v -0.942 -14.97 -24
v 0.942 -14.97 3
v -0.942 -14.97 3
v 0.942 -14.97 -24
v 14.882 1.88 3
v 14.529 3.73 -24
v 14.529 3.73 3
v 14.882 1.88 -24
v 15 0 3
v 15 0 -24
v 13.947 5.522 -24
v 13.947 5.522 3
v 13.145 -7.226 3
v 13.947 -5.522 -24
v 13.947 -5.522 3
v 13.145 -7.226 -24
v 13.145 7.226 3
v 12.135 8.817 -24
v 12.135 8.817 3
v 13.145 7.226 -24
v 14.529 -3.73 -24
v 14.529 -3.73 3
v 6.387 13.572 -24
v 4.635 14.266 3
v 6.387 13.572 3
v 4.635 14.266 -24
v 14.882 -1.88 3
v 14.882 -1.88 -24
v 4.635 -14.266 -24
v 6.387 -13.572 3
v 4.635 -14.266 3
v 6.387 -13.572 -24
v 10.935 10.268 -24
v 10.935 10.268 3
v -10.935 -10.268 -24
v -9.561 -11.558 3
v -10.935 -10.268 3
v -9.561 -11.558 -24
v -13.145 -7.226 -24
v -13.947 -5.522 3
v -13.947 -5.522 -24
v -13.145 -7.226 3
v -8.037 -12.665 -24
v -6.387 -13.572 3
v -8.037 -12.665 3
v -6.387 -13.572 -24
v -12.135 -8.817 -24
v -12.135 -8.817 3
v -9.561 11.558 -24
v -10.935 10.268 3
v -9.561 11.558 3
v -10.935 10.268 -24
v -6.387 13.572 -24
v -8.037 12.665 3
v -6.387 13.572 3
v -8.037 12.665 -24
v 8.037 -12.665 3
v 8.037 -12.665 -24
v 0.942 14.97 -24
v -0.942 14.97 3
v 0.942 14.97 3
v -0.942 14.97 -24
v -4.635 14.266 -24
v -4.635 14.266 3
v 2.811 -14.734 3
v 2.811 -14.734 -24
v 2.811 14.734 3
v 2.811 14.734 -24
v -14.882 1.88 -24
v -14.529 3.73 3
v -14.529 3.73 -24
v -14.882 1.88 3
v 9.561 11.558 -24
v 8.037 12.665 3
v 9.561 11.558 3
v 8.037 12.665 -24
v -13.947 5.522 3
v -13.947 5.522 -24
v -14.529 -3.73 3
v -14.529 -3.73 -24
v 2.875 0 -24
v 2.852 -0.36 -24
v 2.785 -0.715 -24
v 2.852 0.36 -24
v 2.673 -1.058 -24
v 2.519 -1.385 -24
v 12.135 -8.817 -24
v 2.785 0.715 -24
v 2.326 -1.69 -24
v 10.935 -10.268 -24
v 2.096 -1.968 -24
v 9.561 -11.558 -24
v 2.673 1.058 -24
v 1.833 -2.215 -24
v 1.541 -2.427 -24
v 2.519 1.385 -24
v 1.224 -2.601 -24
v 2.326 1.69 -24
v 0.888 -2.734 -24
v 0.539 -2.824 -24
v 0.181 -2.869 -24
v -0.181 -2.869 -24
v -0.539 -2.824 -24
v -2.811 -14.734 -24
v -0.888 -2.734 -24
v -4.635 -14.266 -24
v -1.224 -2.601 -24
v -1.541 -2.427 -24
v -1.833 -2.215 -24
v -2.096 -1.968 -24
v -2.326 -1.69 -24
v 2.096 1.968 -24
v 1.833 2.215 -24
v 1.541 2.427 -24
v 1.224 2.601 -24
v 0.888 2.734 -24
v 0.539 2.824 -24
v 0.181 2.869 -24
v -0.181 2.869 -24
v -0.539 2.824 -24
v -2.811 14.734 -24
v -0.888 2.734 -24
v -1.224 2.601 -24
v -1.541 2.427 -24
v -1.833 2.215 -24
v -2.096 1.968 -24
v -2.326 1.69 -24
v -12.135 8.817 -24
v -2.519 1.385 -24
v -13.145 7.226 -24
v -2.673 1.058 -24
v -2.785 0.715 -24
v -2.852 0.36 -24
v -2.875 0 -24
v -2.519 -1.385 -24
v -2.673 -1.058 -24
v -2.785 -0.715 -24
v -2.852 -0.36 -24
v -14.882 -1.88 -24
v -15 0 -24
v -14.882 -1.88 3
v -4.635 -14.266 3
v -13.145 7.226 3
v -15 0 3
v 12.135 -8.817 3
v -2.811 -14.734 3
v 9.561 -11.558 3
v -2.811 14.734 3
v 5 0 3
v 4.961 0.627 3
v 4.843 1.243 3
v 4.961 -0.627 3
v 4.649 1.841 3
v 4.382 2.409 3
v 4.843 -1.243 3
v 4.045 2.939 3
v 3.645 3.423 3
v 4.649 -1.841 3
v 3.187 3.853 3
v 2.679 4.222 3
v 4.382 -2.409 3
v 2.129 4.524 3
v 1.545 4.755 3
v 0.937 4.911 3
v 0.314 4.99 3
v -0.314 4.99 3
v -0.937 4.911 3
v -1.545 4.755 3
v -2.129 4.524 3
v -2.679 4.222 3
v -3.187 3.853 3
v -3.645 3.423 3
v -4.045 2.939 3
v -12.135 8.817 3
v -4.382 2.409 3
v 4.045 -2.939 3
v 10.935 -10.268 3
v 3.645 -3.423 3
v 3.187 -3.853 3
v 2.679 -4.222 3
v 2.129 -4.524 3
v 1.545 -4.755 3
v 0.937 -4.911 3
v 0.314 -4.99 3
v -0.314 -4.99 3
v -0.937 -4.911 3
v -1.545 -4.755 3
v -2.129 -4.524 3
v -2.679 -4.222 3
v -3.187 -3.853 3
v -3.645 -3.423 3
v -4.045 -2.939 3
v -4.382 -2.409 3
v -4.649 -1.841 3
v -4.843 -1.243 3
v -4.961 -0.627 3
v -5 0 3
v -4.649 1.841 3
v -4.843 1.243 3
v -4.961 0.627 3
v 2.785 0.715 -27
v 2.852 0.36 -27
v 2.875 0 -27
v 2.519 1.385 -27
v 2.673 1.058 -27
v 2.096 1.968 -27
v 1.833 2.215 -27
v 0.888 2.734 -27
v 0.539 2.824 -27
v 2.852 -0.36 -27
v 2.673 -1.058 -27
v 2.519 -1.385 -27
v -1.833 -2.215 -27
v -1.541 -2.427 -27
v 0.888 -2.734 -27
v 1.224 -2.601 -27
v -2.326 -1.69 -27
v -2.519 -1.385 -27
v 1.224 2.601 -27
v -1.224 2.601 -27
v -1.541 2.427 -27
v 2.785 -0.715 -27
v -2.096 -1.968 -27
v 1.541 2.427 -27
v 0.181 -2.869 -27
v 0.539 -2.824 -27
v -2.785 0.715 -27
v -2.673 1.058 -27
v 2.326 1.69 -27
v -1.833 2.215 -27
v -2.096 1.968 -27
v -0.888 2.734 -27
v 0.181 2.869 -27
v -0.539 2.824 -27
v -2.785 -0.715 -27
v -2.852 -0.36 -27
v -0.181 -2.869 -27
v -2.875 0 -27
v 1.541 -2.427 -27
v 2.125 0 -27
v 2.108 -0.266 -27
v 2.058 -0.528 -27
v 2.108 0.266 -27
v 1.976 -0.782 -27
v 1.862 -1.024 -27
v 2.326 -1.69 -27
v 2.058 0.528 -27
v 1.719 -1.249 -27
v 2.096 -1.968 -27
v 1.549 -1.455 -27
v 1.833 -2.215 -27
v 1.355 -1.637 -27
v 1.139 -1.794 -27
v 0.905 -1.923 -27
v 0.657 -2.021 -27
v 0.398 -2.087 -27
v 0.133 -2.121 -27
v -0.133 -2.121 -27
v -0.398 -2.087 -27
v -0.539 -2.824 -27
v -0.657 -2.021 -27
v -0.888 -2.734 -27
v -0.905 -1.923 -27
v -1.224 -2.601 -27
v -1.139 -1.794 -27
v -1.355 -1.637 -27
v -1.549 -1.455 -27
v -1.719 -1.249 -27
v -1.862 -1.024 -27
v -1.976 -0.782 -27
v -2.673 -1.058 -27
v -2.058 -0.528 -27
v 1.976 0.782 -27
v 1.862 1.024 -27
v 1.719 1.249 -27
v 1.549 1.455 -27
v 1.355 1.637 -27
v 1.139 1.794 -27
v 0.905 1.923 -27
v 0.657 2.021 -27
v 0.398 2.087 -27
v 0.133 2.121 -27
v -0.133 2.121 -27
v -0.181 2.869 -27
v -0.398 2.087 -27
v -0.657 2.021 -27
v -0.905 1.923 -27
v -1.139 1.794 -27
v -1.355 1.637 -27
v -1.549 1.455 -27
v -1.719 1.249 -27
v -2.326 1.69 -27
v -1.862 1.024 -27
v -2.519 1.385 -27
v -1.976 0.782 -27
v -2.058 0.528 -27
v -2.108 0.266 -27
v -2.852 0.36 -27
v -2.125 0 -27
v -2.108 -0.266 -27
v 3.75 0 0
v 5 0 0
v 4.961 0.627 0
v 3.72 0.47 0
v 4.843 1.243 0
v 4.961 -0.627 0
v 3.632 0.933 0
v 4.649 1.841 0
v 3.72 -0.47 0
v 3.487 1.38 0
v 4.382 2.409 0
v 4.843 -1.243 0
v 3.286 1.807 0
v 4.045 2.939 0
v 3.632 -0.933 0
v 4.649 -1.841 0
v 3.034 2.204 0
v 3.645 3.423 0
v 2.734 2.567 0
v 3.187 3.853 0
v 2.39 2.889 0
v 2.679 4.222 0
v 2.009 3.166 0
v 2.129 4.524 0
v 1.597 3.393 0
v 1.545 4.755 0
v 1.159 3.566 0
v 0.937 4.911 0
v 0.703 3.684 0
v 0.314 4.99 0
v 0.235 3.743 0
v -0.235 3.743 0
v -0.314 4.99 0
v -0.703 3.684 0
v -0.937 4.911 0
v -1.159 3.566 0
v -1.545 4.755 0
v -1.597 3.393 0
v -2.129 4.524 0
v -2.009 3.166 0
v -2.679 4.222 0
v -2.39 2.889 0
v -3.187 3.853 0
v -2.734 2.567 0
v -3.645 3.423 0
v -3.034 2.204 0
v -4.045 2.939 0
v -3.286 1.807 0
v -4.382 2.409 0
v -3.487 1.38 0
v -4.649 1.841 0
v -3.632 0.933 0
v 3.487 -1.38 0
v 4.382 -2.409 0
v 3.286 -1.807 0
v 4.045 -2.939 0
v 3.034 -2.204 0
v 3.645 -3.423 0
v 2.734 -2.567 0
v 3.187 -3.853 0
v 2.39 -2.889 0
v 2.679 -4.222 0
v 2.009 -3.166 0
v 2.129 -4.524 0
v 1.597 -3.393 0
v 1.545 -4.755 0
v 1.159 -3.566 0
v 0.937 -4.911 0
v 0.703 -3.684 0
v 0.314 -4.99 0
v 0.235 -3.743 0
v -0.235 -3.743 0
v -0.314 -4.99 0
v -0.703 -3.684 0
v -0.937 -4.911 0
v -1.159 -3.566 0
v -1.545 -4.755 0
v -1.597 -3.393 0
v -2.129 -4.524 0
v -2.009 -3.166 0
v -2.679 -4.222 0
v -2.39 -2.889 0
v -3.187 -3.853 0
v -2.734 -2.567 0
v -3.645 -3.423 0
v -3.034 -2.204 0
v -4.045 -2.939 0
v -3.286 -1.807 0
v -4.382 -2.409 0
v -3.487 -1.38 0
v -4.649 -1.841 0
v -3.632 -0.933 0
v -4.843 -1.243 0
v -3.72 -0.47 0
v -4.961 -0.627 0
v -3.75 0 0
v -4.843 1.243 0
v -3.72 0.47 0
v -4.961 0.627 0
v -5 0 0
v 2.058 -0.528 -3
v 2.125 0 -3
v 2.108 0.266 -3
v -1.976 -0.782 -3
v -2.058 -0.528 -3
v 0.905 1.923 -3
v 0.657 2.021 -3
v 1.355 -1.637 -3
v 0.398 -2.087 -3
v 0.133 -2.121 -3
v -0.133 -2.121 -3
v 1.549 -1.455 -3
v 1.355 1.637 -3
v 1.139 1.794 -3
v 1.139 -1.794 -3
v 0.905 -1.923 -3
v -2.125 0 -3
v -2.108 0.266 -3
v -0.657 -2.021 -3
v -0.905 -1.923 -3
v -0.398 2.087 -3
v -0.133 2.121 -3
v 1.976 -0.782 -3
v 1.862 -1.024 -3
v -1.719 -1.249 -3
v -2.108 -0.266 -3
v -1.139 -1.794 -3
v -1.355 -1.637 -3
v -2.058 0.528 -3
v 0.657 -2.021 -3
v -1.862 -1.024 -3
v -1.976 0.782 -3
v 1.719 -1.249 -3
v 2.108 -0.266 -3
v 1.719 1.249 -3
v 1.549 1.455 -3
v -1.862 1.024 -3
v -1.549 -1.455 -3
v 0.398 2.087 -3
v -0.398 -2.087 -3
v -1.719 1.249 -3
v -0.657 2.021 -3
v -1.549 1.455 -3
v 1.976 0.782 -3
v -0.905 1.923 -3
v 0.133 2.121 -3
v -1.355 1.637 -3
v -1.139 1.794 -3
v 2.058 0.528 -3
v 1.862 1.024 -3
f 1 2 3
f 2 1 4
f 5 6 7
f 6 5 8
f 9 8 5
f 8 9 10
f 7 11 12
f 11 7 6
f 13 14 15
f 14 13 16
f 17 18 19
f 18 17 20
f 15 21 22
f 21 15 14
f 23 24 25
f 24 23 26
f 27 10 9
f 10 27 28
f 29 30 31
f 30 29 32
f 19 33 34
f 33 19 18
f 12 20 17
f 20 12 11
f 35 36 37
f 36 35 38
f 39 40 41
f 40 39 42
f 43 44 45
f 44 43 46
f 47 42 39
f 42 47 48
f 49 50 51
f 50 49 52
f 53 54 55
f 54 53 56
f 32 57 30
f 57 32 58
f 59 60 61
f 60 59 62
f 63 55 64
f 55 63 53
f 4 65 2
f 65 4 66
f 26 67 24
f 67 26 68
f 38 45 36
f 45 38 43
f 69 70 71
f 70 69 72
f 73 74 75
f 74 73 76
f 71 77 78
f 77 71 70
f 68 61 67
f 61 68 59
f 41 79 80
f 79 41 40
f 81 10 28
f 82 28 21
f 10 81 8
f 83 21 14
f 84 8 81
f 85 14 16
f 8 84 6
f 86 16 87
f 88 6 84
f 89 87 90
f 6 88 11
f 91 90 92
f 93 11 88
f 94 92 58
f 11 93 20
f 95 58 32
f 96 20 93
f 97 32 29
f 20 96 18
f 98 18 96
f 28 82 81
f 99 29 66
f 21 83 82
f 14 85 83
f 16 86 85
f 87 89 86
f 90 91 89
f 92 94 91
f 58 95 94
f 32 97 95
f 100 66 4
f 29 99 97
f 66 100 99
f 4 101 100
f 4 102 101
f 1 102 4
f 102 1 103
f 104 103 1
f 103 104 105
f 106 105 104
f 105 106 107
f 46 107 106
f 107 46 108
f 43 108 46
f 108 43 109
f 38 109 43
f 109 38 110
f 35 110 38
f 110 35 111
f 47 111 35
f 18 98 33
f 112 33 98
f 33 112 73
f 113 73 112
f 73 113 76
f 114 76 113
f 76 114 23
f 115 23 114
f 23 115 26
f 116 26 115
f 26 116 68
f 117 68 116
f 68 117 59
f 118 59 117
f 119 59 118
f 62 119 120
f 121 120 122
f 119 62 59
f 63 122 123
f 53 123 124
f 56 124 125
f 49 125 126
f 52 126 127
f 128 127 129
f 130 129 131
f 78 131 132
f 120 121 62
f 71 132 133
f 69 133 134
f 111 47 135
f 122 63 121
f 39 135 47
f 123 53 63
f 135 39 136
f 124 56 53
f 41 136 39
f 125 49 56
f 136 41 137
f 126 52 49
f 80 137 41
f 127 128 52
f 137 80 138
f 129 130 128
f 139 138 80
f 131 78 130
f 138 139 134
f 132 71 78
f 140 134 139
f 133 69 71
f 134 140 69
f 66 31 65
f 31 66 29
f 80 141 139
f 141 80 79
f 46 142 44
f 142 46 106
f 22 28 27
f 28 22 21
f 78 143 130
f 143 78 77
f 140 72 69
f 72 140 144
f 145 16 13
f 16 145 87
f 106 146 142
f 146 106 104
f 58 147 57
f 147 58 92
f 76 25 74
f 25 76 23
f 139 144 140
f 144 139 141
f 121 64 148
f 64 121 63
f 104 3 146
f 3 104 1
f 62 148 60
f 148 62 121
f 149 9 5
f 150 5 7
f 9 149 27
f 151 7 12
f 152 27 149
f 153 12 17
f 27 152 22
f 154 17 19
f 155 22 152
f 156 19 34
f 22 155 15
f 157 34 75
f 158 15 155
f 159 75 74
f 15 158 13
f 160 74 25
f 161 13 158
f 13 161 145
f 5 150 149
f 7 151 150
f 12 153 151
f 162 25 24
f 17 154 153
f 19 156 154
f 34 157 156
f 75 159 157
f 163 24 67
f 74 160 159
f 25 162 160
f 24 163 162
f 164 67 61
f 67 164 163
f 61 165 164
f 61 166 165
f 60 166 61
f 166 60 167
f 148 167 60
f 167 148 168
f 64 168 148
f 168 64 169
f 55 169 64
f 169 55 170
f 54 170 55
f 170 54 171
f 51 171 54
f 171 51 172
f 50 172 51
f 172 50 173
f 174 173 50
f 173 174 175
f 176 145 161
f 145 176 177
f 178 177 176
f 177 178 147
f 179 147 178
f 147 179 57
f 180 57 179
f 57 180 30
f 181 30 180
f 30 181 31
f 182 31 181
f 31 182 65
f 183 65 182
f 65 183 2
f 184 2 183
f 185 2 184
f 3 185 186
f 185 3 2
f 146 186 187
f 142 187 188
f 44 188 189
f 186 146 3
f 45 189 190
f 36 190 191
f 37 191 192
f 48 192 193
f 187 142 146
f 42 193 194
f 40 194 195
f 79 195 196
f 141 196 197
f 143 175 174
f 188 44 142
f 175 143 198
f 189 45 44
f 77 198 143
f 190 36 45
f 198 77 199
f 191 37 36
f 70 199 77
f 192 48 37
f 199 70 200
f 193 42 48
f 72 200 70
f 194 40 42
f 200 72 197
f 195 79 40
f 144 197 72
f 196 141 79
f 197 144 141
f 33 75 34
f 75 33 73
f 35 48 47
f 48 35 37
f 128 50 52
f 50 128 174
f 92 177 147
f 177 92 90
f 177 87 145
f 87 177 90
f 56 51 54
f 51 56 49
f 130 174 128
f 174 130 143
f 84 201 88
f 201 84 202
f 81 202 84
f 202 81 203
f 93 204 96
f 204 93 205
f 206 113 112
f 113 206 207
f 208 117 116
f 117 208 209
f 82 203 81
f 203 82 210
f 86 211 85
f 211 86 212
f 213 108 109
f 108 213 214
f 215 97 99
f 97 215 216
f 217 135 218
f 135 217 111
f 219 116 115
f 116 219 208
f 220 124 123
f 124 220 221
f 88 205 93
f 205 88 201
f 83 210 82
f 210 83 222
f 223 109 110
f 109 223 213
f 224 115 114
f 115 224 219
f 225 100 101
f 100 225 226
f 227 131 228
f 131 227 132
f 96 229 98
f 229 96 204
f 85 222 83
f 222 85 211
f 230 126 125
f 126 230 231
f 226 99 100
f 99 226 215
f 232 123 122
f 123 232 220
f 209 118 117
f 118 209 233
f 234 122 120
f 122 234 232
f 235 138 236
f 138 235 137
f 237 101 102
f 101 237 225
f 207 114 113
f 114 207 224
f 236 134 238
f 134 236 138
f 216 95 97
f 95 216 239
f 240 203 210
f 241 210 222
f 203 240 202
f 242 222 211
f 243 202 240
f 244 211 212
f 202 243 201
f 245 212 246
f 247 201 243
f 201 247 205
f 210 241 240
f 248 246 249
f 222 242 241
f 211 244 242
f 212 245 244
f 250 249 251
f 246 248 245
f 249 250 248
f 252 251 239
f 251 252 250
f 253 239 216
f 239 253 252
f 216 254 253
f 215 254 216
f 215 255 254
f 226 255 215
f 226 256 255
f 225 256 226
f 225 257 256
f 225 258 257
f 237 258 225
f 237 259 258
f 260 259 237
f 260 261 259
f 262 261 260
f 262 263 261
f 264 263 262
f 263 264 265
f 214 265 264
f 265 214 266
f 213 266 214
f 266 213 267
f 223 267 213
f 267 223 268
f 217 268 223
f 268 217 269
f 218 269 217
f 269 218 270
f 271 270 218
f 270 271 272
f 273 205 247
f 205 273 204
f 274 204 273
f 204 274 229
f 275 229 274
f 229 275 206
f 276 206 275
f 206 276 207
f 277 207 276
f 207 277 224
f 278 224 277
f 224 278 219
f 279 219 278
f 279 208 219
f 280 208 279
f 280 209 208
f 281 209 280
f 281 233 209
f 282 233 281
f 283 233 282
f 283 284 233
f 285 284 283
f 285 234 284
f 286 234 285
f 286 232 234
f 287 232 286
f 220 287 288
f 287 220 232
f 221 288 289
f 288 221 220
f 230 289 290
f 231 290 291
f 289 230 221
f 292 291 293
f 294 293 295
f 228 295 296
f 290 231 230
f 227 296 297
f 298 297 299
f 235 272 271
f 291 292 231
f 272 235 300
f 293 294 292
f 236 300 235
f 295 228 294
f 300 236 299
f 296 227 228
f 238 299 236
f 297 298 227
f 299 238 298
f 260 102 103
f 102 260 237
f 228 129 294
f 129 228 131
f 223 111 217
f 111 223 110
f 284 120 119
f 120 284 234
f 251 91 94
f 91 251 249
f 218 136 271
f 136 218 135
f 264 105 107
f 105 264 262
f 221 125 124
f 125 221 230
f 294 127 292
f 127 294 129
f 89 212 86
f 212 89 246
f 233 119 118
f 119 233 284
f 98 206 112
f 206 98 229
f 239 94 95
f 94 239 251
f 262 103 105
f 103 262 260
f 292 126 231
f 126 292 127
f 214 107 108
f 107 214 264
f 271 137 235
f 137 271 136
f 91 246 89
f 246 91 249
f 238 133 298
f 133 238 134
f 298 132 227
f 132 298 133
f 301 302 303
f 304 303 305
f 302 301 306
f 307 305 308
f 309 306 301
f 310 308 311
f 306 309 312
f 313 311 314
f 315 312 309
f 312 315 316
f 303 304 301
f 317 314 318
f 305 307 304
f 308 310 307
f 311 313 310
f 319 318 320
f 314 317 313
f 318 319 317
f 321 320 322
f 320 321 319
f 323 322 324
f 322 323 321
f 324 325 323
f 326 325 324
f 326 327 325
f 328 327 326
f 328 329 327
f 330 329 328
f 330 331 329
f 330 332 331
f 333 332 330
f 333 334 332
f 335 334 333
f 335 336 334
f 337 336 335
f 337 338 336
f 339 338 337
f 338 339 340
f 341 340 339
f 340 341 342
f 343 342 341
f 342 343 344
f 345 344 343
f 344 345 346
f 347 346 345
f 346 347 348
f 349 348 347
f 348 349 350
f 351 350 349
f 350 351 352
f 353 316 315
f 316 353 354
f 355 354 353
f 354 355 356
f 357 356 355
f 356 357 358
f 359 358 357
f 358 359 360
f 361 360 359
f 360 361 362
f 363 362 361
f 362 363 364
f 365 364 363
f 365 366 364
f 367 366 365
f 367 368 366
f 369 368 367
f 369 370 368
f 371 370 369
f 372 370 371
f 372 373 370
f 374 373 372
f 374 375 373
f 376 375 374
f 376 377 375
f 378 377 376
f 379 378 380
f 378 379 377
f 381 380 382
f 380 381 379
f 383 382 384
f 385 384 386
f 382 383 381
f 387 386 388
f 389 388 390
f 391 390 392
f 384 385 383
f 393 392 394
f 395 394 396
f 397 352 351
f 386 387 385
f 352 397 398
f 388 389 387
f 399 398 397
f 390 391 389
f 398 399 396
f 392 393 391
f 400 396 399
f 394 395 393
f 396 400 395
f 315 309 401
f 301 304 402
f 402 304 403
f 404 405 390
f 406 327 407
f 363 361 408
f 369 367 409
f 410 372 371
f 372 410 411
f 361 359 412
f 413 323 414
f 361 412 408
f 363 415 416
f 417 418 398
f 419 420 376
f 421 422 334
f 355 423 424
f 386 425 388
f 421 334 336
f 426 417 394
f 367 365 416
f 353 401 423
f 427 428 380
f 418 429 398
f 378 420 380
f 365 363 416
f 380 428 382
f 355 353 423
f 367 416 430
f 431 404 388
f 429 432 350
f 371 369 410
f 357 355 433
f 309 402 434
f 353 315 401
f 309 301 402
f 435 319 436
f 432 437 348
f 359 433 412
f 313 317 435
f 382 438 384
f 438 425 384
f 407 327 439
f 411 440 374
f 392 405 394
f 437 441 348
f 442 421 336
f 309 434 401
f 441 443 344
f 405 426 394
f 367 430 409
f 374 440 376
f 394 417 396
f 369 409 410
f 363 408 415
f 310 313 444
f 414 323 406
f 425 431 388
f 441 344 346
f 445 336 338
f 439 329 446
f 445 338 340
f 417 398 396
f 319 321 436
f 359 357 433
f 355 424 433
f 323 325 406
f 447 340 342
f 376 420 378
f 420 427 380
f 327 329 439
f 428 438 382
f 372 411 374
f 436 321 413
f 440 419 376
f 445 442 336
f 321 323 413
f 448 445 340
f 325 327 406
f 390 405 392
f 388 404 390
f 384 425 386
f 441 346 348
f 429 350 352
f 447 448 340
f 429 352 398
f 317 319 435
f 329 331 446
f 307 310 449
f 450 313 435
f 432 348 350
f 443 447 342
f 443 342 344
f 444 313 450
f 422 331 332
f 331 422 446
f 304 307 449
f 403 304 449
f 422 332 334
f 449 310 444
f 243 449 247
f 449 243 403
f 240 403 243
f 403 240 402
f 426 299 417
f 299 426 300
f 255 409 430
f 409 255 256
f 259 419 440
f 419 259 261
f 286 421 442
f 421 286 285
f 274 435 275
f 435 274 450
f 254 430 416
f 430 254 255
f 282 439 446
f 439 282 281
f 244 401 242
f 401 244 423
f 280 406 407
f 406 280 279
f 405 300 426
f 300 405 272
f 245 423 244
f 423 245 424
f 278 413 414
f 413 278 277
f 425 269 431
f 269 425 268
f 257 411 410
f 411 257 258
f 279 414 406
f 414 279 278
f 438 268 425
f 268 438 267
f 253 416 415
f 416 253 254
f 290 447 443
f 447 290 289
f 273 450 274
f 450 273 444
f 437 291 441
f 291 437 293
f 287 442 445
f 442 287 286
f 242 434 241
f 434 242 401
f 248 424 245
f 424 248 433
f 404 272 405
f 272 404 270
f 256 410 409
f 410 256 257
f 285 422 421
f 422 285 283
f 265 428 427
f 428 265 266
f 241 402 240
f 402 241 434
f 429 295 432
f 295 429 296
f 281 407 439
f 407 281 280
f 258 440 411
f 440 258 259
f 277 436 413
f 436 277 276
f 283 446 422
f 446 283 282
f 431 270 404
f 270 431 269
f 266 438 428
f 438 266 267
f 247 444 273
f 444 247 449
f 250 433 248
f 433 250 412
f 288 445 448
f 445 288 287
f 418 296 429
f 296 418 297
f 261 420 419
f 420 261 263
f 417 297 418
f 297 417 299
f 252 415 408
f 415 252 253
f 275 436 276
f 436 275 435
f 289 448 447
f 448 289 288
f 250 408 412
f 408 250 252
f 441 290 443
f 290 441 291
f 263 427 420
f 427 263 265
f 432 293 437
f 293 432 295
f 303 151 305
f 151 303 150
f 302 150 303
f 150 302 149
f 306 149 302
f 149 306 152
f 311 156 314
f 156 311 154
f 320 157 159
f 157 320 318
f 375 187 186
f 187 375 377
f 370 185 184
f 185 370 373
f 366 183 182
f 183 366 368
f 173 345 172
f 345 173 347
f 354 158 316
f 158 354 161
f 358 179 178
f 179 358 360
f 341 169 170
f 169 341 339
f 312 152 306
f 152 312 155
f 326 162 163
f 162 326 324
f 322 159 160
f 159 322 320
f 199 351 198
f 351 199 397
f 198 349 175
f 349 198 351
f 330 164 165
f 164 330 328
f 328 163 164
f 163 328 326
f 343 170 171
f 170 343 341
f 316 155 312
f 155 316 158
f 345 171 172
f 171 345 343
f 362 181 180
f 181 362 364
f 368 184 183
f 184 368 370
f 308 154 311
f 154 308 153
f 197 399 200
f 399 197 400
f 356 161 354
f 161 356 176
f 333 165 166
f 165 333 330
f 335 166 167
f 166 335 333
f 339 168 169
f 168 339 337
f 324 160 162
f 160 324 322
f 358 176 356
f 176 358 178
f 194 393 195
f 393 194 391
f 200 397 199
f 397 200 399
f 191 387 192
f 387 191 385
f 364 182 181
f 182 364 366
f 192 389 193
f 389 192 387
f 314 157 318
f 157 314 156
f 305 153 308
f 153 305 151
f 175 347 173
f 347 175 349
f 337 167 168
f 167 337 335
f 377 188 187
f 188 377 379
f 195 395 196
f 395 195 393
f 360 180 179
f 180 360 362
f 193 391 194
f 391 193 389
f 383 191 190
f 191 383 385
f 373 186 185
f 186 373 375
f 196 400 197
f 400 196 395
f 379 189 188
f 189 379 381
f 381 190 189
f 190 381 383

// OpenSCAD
$fn = 50;

difference() {
	union() {
		translate(v = [0, 0, -24.0]) {
			cylinder(h = 27, r = 15.0);
		}
		#translate(v = [0, 0, -27.0]) {
			cylinder(h = 27, r = 2.875);
		}
	}
	union() {
		translate(v = [0, 0, 0]) {
			rotate(a = [0, 0, 0]) {
				difference() {
					union() {
						translate(v = [0, 0, -27.0]) {
							cylinder(h = 27, r = 2.0);
						}
						translate(v = [0, 0, -3]) {
							cylinder(h = 3, r1 = 2.125, r2 = 3.75);
						}
						translate(v = [0, 0, -27.0]) {
							cylinder(h = 27, r = 2.125);
						}
						translate(v = [0, 0, -27.0]) {
							cylinder(h = 27, r = 2.0);
						}
					}
					union();
				}
			}
		}
		#cylinder(h = 3, r = 5.0);
	}
}
